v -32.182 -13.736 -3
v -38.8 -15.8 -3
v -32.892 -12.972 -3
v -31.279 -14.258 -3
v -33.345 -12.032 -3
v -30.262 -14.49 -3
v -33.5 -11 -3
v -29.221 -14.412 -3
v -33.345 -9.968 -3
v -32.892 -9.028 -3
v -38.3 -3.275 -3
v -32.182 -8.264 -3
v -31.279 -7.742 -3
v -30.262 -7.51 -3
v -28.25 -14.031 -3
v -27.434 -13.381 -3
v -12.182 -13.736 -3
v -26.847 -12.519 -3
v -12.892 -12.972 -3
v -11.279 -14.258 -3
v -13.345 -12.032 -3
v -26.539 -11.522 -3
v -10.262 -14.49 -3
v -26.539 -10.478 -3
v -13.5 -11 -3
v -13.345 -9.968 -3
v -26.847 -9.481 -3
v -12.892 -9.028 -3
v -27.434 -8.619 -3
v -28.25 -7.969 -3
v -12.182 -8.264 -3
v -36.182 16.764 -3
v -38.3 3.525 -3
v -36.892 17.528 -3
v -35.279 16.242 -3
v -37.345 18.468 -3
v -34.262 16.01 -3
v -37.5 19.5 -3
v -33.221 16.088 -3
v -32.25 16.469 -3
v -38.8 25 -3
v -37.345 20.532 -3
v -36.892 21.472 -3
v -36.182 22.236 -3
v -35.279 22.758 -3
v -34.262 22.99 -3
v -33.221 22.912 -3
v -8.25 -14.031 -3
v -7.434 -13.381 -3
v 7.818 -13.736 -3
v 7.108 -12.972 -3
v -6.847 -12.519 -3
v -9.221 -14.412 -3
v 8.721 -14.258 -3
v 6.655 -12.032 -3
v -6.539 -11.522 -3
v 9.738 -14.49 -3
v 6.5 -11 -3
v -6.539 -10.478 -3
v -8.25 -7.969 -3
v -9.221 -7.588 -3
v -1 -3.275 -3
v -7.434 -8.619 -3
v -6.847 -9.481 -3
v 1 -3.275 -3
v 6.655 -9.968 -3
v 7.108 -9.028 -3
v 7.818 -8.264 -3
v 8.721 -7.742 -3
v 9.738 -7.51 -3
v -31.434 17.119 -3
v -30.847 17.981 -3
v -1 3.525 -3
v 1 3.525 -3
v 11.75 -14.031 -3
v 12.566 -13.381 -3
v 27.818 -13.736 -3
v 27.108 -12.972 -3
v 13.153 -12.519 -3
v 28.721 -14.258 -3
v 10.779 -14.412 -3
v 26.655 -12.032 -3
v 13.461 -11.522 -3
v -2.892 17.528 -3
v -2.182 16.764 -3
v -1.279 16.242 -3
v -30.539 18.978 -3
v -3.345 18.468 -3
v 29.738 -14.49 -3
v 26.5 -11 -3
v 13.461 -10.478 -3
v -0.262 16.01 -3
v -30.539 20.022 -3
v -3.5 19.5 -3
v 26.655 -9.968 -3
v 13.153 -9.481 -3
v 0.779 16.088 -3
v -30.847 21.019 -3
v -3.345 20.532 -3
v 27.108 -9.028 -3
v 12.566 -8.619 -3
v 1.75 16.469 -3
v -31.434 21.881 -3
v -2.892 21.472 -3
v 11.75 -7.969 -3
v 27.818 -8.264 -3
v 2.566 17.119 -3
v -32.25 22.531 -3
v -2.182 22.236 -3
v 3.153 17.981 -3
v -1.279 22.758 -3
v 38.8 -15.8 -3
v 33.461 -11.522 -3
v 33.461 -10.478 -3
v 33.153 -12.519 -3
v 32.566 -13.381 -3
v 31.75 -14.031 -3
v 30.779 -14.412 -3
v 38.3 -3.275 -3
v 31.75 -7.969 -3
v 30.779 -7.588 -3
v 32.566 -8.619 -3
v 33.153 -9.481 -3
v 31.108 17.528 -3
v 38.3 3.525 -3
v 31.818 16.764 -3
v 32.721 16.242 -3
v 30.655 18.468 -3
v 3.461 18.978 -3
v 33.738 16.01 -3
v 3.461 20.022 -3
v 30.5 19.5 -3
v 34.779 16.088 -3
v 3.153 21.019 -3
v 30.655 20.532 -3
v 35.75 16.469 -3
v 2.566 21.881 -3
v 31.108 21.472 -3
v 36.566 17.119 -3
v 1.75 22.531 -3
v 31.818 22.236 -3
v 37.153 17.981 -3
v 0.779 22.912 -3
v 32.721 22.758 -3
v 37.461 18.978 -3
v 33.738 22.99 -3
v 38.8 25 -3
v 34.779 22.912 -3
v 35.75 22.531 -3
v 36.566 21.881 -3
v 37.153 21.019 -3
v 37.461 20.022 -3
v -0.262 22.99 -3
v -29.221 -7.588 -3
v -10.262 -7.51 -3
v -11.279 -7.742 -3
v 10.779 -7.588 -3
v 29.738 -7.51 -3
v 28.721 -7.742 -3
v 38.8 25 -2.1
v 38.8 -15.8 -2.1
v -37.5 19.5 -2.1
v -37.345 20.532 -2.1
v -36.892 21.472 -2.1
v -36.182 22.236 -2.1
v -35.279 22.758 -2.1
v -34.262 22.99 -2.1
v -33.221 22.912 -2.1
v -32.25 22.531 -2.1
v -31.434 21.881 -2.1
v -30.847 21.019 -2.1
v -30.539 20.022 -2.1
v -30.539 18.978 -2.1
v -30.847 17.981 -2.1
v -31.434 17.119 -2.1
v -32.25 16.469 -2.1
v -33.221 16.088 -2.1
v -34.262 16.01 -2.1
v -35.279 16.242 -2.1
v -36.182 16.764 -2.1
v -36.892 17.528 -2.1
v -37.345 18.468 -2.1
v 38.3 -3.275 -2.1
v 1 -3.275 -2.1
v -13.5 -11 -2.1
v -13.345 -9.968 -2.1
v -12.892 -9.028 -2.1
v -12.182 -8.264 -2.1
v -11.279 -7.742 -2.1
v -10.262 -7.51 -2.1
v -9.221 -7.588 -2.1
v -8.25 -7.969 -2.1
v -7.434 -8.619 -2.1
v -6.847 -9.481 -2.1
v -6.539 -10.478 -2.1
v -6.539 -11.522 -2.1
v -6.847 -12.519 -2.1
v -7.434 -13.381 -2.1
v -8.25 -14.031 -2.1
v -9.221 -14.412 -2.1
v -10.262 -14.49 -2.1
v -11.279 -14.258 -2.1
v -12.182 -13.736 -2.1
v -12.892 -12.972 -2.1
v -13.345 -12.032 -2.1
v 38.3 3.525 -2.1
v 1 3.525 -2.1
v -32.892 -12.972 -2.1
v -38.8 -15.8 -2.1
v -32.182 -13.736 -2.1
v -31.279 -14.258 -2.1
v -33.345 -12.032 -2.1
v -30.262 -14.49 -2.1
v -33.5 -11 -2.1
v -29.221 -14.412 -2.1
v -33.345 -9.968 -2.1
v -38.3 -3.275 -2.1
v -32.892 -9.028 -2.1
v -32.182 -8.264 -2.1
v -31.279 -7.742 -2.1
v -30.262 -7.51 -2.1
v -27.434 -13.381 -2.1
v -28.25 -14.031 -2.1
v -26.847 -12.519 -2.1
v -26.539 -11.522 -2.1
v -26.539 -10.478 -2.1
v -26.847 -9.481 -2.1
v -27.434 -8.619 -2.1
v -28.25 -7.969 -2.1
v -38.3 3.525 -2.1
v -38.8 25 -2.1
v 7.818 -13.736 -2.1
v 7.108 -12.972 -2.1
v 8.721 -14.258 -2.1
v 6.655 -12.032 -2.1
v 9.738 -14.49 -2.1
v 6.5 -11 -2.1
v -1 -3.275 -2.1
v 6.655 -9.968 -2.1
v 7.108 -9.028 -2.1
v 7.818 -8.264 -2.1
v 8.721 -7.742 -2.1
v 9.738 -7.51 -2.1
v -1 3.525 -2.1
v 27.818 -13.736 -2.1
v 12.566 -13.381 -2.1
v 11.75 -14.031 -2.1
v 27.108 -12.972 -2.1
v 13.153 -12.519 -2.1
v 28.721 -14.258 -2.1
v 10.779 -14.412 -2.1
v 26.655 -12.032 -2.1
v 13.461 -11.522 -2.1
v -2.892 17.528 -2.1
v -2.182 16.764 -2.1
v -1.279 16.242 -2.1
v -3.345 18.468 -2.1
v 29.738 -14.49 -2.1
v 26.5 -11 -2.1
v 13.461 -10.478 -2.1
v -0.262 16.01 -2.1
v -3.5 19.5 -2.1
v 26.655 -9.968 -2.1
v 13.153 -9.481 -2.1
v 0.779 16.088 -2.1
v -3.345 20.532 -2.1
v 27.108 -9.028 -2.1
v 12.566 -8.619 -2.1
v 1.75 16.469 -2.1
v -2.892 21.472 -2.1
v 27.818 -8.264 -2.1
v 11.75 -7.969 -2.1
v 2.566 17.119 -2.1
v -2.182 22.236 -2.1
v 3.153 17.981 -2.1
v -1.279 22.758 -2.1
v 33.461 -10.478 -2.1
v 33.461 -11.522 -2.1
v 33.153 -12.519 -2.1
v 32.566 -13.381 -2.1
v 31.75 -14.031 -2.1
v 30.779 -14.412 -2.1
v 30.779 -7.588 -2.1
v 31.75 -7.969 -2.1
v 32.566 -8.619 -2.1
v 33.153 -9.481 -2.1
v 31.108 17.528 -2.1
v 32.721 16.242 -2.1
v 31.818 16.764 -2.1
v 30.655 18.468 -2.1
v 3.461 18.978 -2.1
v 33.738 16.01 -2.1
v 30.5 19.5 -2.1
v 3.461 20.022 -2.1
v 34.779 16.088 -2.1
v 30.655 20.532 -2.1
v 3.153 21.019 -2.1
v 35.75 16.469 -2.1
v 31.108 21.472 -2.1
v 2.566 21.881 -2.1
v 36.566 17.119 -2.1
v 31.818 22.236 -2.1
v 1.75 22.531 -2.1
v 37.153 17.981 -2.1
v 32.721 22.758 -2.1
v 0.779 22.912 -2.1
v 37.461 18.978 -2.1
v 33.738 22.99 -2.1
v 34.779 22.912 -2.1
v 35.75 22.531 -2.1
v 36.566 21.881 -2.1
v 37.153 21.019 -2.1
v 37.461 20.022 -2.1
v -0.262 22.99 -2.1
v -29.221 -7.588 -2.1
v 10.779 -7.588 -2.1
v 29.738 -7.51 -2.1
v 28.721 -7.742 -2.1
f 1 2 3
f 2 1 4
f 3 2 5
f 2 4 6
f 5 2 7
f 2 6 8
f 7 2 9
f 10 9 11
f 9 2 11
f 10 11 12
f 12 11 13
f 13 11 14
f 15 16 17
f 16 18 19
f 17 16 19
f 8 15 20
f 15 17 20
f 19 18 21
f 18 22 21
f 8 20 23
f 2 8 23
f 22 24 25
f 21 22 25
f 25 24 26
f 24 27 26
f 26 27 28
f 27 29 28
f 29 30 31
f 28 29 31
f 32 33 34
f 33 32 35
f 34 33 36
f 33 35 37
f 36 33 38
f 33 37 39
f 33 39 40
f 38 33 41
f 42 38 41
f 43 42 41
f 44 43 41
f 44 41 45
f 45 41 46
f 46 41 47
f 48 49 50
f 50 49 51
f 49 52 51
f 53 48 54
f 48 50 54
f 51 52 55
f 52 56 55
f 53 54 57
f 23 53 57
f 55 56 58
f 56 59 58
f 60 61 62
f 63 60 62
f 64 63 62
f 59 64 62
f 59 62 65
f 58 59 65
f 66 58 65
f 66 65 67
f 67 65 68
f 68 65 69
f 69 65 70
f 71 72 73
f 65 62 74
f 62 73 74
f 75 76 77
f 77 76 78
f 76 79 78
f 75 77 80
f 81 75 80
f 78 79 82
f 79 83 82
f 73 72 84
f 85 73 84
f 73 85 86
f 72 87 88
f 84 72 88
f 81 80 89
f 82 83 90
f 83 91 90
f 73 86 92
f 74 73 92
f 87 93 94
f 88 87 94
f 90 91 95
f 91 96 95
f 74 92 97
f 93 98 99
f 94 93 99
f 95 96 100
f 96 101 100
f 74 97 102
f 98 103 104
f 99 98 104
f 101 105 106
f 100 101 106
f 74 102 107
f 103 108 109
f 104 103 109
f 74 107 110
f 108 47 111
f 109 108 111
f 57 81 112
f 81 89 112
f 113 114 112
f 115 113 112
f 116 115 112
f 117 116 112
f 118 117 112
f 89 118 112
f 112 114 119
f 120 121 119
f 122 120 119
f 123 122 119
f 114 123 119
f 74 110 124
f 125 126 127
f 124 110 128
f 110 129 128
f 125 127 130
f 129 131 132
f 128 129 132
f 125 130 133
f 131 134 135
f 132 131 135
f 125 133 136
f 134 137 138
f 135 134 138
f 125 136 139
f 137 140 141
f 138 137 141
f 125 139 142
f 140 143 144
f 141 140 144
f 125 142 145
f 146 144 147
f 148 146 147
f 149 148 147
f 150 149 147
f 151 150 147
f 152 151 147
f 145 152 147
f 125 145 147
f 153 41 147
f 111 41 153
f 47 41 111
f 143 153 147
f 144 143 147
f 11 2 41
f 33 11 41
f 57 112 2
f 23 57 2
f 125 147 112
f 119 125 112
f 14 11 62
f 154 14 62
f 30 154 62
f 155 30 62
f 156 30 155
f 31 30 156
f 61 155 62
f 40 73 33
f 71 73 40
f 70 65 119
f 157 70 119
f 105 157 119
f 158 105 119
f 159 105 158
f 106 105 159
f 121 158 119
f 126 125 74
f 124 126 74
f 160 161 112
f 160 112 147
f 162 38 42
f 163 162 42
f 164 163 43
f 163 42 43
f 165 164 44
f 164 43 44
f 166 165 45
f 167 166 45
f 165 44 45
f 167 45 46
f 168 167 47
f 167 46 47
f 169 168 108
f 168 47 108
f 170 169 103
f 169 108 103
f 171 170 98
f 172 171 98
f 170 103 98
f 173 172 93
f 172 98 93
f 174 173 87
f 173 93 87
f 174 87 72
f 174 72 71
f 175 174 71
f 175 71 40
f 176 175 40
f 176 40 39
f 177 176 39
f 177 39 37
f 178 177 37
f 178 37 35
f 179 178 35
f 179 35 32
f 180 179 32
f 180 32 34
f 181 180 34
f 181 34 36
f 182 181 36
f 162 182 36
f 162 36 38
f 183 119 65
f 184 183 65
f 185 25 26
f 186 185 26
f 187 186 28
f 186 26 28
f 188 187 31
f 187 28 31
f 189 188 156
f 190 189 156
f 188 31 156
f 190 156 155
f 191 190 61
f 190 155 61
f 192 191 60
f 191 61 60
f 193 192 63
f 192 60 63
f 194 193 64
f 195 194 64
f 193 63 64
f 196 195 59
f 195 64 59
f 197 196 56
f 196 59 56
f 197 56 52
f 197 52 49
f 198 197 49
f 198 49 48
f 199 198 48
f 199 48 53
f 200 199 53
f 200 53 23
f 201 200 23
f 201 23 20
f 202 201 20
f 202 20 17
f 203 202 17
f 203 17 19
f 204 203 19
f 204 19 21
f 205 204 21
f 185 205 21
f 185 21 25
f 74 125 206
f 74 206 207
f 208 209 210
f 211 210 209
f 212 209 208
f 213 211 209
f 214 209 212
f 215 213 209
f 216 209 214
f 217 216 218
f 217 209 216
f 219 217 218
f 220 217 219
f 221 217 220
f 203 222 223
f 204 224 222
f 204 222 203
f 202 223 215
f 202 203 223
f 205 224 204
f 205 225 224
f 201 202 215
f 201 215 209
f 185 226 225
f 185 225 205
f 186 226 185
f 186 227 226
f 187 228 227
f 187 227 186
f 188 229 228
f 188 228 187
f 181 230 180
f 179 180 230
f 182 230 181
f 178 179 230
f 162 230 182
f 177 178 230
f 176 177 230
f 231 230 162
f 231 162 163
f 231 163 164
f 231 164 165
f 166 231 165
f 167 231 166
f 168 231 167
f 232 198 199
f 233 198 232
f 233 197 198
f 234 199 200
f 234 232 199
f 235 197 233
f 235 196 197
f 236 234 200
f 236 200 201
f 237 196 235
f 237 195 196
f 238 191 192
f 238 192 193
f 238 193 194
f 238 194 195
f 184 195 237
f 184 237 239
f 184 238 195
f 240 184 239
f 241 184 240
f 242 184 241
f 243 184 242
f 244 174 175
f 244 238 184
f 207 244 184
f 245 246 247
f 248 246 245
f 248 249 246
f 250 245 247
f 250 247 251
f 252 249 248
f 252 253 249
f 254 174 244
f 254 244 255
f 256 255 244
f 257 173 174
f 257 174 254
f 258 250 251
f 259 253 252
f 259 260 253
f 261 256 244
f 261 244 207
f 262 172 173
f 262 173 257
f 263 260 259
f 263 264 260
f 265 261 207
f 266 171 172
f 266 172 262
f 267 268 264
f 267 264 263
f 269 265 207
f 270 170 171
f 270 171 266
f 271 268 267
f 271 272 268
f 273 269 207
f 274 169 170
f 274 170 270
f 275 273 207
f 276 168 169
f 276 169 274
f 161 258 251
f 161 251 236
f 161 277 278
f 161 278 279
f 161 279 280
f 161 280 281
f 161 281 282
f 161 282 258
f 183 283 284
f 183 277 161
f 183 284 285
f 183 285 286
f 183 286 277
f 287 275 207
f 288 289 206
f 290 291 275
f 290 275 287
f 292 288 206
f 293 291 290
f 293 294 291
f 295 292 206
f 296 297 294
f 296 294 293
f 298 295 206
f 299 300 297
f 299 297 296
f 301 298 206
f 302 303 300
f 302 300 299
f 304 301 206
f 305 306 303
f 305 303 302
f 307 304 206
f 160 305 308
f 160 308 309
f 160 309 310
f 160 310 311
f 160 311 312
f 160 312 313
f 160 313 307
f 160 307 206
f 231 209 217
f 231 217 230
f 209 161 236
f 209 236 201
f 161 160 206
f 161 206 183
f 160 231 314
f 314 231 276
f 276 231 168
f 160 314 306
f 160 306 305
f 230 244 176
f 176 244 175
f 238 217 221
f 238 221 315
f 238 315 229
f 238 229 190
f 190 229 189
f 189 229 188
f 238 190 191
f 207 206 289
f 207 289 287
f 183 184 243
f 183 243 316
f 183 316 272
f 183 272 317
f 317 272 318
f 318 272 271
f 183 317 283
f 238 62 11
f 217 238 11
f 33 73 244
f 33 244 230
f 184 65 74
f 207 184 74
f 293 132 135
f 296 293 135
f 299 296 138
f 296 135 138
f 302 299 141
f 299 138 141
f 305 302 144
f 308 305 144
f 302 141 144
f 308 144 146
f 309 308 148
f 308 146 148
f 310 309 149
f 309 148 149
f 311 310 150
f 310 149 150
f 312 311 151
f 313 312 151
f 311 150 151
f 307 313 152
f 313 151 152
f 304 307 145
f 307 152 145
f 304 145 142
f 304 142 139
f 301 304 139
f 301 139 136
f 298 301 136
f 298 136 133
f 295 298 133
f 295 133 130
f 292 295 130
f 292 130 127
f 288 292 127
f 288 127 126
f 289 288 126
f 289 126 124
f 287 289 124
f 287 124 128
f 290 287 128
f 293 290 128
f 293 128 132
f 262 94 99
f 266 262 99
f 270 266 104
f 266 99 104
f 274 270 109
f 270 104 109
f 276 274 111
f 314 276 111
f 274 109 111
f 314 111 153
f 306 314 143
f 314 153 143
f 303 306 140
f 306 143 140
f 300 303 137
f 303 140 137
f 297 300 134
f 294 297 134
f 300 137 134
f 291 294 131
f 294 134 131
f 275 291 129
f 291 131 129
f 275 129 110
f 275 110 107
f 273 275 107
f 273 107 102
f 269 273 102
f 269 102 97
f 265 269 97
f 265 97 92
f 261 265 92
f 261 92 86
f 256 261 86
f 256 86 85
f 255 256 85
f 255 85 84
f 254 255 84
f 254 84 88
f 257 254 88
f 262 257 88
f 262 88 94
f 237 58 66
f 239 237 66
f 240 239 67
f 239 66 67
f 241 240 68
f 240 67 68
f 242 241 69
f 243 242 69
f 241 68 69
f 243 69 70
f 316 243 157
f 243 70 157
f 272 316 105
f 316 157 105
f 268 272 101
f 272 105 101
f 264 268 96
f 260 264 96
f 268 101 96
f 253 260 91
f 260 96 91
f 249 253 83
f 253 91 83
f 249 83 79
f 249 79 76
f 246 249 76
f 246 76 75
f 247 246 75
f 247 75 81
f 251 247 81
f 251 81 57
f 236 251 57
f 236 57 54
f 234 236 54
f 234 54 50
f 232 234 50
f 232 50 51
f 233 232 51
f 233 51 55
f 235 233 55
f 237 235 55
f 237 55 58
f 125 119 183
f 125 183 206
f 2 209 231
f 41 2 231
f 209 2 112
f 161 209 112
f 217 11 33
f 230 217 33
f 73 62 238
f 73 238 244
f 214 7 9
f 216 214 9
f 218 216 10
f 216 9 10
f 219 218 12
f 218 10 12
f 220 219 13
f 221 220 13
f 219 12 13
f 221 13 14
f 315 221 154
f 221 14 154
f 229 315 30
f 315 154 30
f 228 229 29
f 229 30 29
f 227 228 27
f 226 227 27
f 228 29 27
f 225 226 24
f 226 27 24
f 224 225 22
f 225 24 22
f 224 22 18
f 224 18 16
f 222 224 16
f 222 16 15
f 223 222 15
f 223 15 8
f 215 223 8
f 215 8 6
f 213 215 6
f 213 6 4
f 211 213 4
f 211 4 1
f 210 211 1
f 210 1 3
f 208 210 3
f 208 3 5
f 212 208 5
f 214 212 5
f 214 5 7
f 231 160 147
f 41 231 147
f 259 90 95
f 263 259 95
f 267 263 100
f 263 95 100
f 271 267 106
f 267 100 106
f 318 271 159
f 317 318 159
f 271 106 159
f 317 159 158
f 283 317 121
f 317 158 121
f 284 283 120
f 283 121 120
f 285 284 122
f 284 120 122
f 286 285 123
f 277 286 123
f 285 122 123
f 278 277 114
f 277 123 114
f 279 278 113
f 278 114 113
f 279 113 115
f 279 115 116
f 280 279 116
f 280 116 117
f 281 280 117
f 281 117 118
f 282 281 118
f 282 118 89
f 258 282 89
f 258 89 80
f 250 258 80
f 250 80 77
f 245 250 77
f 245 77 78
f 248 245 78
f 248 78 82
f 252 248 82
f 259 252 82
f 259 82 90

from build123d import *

# Parameters (mm, degrees)
SKETCH14_W                        = 80
SKETCH14_H                        = 42
SKETCH14_W_2                      = 3.75
SKETCH14_H_2                      = 3.75
BASE_WITH_CUTOUTS_DEPTH           = 3
SKETCH15_W                        = 4.3
SKETCH15_H                        = 4.8
SIPM_CUTOUTS_DEPTH                = 48.265209192
PADDLE_SUPPORT_TAPERS_DEPTH       = 2
SKETCH17_W                        = 80
SKETCH17_H                        = 25
PADDLE_SUPPORT_TOP_DEPTH          = 1
PADDLE_START                      = -4
SKETCH17_2_W                      = 80
SKETCH17_2_H                      = 25
PADDLE_SUPPORT_BOTTOM_DEPTH       = 1
PADDLE_SUPPORT_TAPER_TOP_SIZE     = 0.8
PADDLE_SUPPORT_TAPER_TOP_SIZE2    = 2.4
PADDLE_SUPPORT_TAPER_BOTTOM_SIZE  = 2.4
PADDLE_SUPPORT_TAPER_BOTTOM_SIZE2 = 0.8
SKETCH18_W                        = 4
SKETCH18_H                        = 22
SKETCH18_H_2                      = 14
BASE_THICKNESS_EXPANSION_DEPTH    = 80
BAFFLE_BASE_DEPTH                 = 2
BAFFLE_LIP_DEPTH                  = 2
BAFFLE_CHAMFER_1_2_SIZE           = 1.2
BAFFLE_CHAMFER_0_4_SIZE           = 0.4
INSERT_HOLES_PCB_D                = 3.3
INSERT_HOLES_PCB_DEPTH            = 4.2
INSERT_HOLES_PCB_CBORE_D          = 7
INSERT_HOLES_PCB_CBORE_DEPTH      = 1.4
JOINT_MOD_REACH                   = 56.854
SKETCH29_W                        = 37.3
SKETCH29_H                        = 6.8
CUT_EXTRUDE1_DEPTH                = 1.45
CHAMFER1_SIZE                     = 2
CHAMFER1_SIZE2                    = 5.494954839
SKETCH34_W                        = 81.499638764
SKETCH34_H                        = 0.25
CUT_EXTRUDE2_DEPTH                = 24
M1_6_CLEARANCE_HOLE1_D            = 1.8
SKETCH38_W                        = 104.100396554
SKETCH38_H                        = 54.802140704
CUT_EXTRUDE3_DEPTH                = 55.128573785
CUT_EXTRUDE4_DEPTH                = 0.05
SKETCH40_W                        = 1.2
SKETCH40_H                        = 9
CUT_EXTRUDE5_DEPTH                = 48.190677045
SKETCH41_W                        = 77.6
SKETCH41_H                        = 40.8
CUT_EXTRUDE6_DEPTH                = 0.5


with BuildPart() as part:
    # Sketch14 → BASE WITH CUTOUTS (new body)
    with BuildSketch(Plane.XY):
        with Locations((0, 4)):
            Rectangle(SKETCH14_W, SKETCH14_H)
        with Locations((10.45, 0)):
            Rectangle(SKETCH14_W_2, SKETCH14_H_2, mode=Mode.SUBTRACT)
        with Locations((4.15, 0)):
            Rectangle(SKETCH14_W_2, SKETCH14_H_2, mode=Mode.SUBTRACT)
        with Locations((16.75, 0)):
            Rectangle(SKETCH14_W_2, SKETCH14_H_2, mode=Mode.SUBTRACT)
        with Locations((23.05, 0)):
            Rectangle(SKETCH14_W_2, SKETCH14_H_2, mode=Mode.SUBTRACT)
        with Locations((29.35, 0)):
            Rectangle(SKETCH14_W_2, SKETCH14_H_2, mode=Mode.SUBTRACT)
        with Locations((35.65, 0)):
            Rectangle(SKETCH14_W_2, SKETCH14_H_2, mode=Mode.SUBTRACT)
        with Locations((-35.65, 0)):
            Rectangle(SKETCH14_W_2, SKETCH14_H_2, mode=Mode.SUBTRACT)
        with Locations((-29.35, 0)):
            Rectangle(SKETCH14_W_2, SKETCH14_H_2, mode=Mode.SUBTRACT)
        with Locations((-23.05, 0)):
            Rectangle(SKETCH14_W_2, SKETCH14_H_2, mode=Mode.SUBTRACT)
        with Locations((-16.75, 0)):
            Rectangle(SKETCH14_W_2, SKETCH14_H_2, mode=Mode.SUBTRACT)
        with Locations((-10.45, 0)):
            Rectangle(SKETCH14_W_2, SKETCH14_H_2, mode=Mode.SUBTRACT)
        with Locations((-4.15, 0)):
            Rectangle(SKETCH14_W_2, SKETCH14_H_2, mode=Mode.SUBTRACT)
    extrude(amount=-BASE_WITH_CUTOUTS_DEPTH)

    # Sketch15 → SIPM CUTOUTS (cut, through all)
    with BuildSketch(Plane(origin=(0, 0, -3), x_dir=(-1, 0, 0), z_dir=(0, 0, -1))):
        with Locations((-35.65, 0.125)):
            Rectangle(SKETCH15_W, SKETCH15_H)
        with Locations((-29.35, 0.125)):
            Rectangle(SKETCH15_W, SKETCH15_H)
        with Locations((-23.05, 0.125)):
            Rectangle(SKETCH15_W, SKETCH15_H)
        with Locations((-16.75, 0.125)):
            Rectangle(SKETCH15_W, SKETCH15_H)
        with Locations((-10.45, 0.125)):
            Rectangle(SKETCH15_W, SKETCH15_H)
        with Locations((-4.15, 0.125)):
            Rectangle(SKETCH15_W, SKETCH15_H)
        with Locations((4.15, 0.125)):
            Rectangle(SKETCH15_W, SKETCH15_H)
        with Locations((10.45, 0.125)):
            Rectangle(SKETCH15_W, SKETCH15_H)
        with Locations((16.75, 0.125)):
            Rectangle(SKETCH15_W, SKETCH15_H)
        with Locations((23.05, 0.125)):
            Rectangle(SKETCH15_W, SKETCH15_H)
        with Locations((29.35, 0.125)):
            Rectangle(SKETCH15_W, SKETCH15_H)
        with Locations((35.65, 0.125)):
            Rectangle(SKETCH15_W, SKETCH15_H)
    extrude(amount=-SIPM_CUTOUTS_DEPTH, mode=Mode.SUBTRACT)

    # Sketch16 → PADDLE SUPPORT - TAPERS (add, symmetric)
    with BuildSketch(Plane(origin=(0, 0, 0), x_dir=(1, 0, 0), z_dir=(0, 1, 0))):
        Polygon((40, 0), (37.691381155, 0), (40, -16.789955233), align=None)
        Polygon((0, 0), (2.308618845, 0), (0, -16.789955233), (-2.308618845, 0), align=None)
        Polygon((-40, -16.789955233), (-37.691381155, 0), (-40, 0), align=None)
    extrude(amount=PADDLE_SUPPORT_TAPERS_DEPTH, both=True)

    # Sketch17 → PADDLE SUPPORT - TOP (add)
    with BuildSketch(Plane(origin=(0, 2, 0), x_dir=(1, 0, 0), z_dir=(0, 1, 0))):
        with Locations((0, -12.5)):
            Rectangle(SKETCH17_W, SKETCH17_H)
    extrude(amount=PADDLE_SUPPORT_TOP_DEPTH)

    # Sketch17<2> → PADDLE SUPPORT - BOTTOM (add)
    with BuildSketch(Plane(origin=(0, 2, 0), x_dir=(1, 0, 0), z_dir=(0, 1, 0)).offset(PADDLE_START)):
        with Locations((0, -12.5)):
            Rectangle(SKETCH17_2_W, SKETCH17_2_H)
    extrude(amount=-PADDLE_SUPPORT_BOTTOM_DEPTH)

    # PADDLE SUPPORT - TAPER TOP
    paddle_support_taper_top_edges = [part.edges().sort_by_distance(p)[0] for p in [
        (0, 3, 25),
    ]]
    paddle_support_taper_top_side = [part.faces().sort_by_distance(p)[0] for p in [
        (0, 2.5, 25),
    ]]
    chamfer(paddle_support_taper_top_edges, length=PADDLE_SUPPORT_TAPER_TOP_SIZE, length2=PADDLE_SUPPORT_TAPER_TOP_SIZE2, reference=paddle_support_taper_top_side[0])

    # PADDLE SUPPORT - TAPER BOTTOM
    paddle_support_taper_bottom_edges = [part.edges().sort_by_distance(p)[0] for p in [
        (0, -3, 25),
    ]]
    paddle_support_taper_bottom_side = [part.faces().sort_by_distance(p)[0] for p in [
        (0, -3, 12.5),
    ]]
    chamfer(paddle_support_taper_bottom_edges, length=PADDLE_SUPPORT_TAPER_BOTTOM_SIZE, length2=PADDLE_SUPPORT_TAPER_BOTTOM_SIZE2, reference=paddle_support_taper_bottom_side[0])

    # Sketch18 → BASE - THICKNESS EXPANSION (add)
    with BuildSketch(Plane(origin=(40, 0, 0), x_dir=(0, 0, -1), z_dir=(1, 0, 0))):
        with Locations((-2, 14)):
            Rectangle(SKETCH18_W, SKETCH18_H)
        with Locations((-2, -10)):
            Rectangle(SKETCH18_W, SKETCH18_H_2)
    extrude(amount=-BASE_THICKNESS_EXPANSION_DEPTH)

    # Sketch19 → BAFFLE - BASE (cut)
    with BuildSketch(Plane(origin=(0, 0, -3), x_dir=(-1, 0, 0), z_dir=(0, 0, -1))):
        Polygon((-40, 16), (-39.2, 16), (-39.2, -16.2), (39.2, -16.2), (39.2, 16), (40, 16), (40, -17), (-40, -17), align=None)
    extrude(amount=-BAFFLE_BASE_DEPTH, mode=Mode.SUBTRACT)

    # Sketch20 → BAFFLE - LIP (cut)
    with BuildSketch(Plane(origin=(0, 0, -1), x_dir=(-1, 0, 0), z_dir=(0, 0, -1))):
        Polygon((-40, 16), (-40, -17), (40, -17), (40, 16), (38.8, 16), (38.8, -15.8), (-38.8, -15.8), (-38.8, 16), align=None)
    extrude(amount=-BAFFLE_LIP_DEPTH, mode=Mode.SUBTRACT)

    # BAFFLE - CHAMFER 1.2
    baffle_chamfer_1_2_edges = [part.edges().sort_by_distance(p)[0] for p in [
        (-40, -0.5, 1),
        (0, -17, 1),
        (40, -0.5, 1),
    ]]
    chamfer(baffle_chamfer_1_2_edges, length=BAFFLE_CHAMFER_1_2_SIZE - 0.0001)  # a hair under: the kernel refuses the full size

    # BAFFLE - CHAMFER 0.4
    baffle_chamfer_0_4_edges = [part.edges().sort_by_distance(p)[0] for p in [
        (39.2, -0.1, -1),
        (-39.2, -0.1, -1),
        (0, -16.2, -1),
    ]]
    chamfer(baffle_chamfer_0_4_edges, length=BAFFLE_CHAMFER_0_4_SIZE - 0.0001)  # a hair under: the kernel refuses the full size

    # INSERT HOLES - PCB
    with Locations(Plane(origin=(0, 0, -3), x_dir=(-1, 0, 0), z_dir=(0, 0, -1))):
        with Locations((-30, -11), (-10, -11), (10, -11), (30, -11), (-34, 19.5), (0, 19.5), (34, 19.5)):
            CounterBoreHole(INSERT_HOLES_PCB_D / 2, INSERT_HOLES_PCB_CBORE_D / 2, INSERT_HOLES_PCB_CBORE_DEPTH, depth=INSERT_HOLES_PCB_DEPTH)

    # Sketch26 → JOINT MOD (cut, up to next)
    with BuildSketch(Plane(origin=(0, 0, -3), x_dir=(-1, 0, 0), z_dir=(0, 0, -1)), mode=Mode.PRIVATE) as joint_mod_sk1:
        Polygon((-38.8, 16), (-38.8, -15.8), (38.8, -15.8), (38.8, 16), (39.2, 16), (39.2, -16.2), (-39.2, -16.2), (-39.2, 16), align=None)
    joint_mod_tool1 = extrude(joint_mod_sk1.sketch, amount=-JOINT_MOD_REACH, mode=Mode.PRIVATE) & part.part
    add(joint_mod_tool1.solids().sort_by_distance((38.884755, 0.1, -3))[0], mode=Mode.SUBTRACT)

    # Sketch29 → Cut-Extrude1 (cut)
    with BuildSketch(Plane(origin=(0, 0, -3), x_dir=(-1, 0, 0), z_dir=(0, 0, -1))):
        with Locations((-19.65, 0.125)):
            Rectangle(SKETCH29_W, SKETCH29_H)
        with Locations((19.65, 0.125)):
            Rectangle(SKETCH29_W, SKETCH29_H)
    extrude(amount=-CUT_EXTRUDE1_DEPTH, mode=Mode.SUBTRACT)

    # Chamfer1
    chamfer1_edges = [part.edges().sort_by_distance(p)[0] for p in [
        (0, 3, 4),
    ]]
    chamfer1_side = [part.faces().sort_by_distance(p)[0] for p in [
        (0, 3, 13.3),
    ]]
    chamfer(chamfer1_edges, length=CHAMFER1_SIZE, length2=CHAMFER1_SIZE2, reference=chamfer1_side[0])

    # Sketch34 → Cut-Extrude2 (cut)
    with BuildSketch(Plane.XY.offset(25)):
        Rectangle(SKETCH34_W, SKETCH34_H)
    extrude(amount=-CUT_EXTRUDE2_DEPTH, mode=Mode.SUBTRACT)

    # M1.6 Clearance Hole1 (through all)
    with Locations(Plane(origin=(0, -3, 0), x_dir=(-1, 0, 0), z_dir=(0, -1, 0))):
        with Locations((0, -8)):
            Hole(M1_6_CLEARANCE_HOLE1_D / 2)

    # Sketch38 → Cut-Extrude3 (cut, through all)
    with BuildSketch(Plane(origin=(0, 0, -1.55), x_dir=(-1, 0, 0), z_dir=(0, 0, -1))):
        Rectangle(SKETCH38_W, SKETCH38_H)
    extrude(amount=-CUT_EXTRUDE3_DEPTH, mode=Mode.SUBTRACT)

    # Sketch39 → Cut-Extrude4 (cut)
    with BuildSketch(Plane.XY.offset(-1.55)):
        Polygon((40, 25), (-40, 25), (-40, 16), (-38.8, 16), (-38.8, -15.8), (38.8, -15.8), (38.8, 16), (40, 16), align=None)
    extrude(amount=-CUT_EXTRUDE4_DEPTH, mode=Mode.SUBTRACT)

    # Sketch40 → Cut-Extrude5 (cut, through all)
    with BuildSketch(Plane.XY.offset(-1.6)):
        with Locations((-39.4, 20.5)):
            Rectangle(SKETCH40_W, SKETCH40_H)
        with Locations((39.4, 20.5)):
            Rectangle(SKETCH40_W, SKETCH40_H)
    extrude(amount=-CUT_EXTRUDE5_DEPTH, mode=Mode.SUBTRACT)

    # Sketch41 → Cut-Extrude6 (cut)
    with BuildSketch(Plane.XY.offset(-1.6)):
        with Locations((0, 4.6)):
            Rectangle(SKETCH41_W, SKETCH41_H)
    extrude(amount=-CUT_EXTRUDE6_DEPTH, mode=Mode.SUBTRACT)


solid = part.part
